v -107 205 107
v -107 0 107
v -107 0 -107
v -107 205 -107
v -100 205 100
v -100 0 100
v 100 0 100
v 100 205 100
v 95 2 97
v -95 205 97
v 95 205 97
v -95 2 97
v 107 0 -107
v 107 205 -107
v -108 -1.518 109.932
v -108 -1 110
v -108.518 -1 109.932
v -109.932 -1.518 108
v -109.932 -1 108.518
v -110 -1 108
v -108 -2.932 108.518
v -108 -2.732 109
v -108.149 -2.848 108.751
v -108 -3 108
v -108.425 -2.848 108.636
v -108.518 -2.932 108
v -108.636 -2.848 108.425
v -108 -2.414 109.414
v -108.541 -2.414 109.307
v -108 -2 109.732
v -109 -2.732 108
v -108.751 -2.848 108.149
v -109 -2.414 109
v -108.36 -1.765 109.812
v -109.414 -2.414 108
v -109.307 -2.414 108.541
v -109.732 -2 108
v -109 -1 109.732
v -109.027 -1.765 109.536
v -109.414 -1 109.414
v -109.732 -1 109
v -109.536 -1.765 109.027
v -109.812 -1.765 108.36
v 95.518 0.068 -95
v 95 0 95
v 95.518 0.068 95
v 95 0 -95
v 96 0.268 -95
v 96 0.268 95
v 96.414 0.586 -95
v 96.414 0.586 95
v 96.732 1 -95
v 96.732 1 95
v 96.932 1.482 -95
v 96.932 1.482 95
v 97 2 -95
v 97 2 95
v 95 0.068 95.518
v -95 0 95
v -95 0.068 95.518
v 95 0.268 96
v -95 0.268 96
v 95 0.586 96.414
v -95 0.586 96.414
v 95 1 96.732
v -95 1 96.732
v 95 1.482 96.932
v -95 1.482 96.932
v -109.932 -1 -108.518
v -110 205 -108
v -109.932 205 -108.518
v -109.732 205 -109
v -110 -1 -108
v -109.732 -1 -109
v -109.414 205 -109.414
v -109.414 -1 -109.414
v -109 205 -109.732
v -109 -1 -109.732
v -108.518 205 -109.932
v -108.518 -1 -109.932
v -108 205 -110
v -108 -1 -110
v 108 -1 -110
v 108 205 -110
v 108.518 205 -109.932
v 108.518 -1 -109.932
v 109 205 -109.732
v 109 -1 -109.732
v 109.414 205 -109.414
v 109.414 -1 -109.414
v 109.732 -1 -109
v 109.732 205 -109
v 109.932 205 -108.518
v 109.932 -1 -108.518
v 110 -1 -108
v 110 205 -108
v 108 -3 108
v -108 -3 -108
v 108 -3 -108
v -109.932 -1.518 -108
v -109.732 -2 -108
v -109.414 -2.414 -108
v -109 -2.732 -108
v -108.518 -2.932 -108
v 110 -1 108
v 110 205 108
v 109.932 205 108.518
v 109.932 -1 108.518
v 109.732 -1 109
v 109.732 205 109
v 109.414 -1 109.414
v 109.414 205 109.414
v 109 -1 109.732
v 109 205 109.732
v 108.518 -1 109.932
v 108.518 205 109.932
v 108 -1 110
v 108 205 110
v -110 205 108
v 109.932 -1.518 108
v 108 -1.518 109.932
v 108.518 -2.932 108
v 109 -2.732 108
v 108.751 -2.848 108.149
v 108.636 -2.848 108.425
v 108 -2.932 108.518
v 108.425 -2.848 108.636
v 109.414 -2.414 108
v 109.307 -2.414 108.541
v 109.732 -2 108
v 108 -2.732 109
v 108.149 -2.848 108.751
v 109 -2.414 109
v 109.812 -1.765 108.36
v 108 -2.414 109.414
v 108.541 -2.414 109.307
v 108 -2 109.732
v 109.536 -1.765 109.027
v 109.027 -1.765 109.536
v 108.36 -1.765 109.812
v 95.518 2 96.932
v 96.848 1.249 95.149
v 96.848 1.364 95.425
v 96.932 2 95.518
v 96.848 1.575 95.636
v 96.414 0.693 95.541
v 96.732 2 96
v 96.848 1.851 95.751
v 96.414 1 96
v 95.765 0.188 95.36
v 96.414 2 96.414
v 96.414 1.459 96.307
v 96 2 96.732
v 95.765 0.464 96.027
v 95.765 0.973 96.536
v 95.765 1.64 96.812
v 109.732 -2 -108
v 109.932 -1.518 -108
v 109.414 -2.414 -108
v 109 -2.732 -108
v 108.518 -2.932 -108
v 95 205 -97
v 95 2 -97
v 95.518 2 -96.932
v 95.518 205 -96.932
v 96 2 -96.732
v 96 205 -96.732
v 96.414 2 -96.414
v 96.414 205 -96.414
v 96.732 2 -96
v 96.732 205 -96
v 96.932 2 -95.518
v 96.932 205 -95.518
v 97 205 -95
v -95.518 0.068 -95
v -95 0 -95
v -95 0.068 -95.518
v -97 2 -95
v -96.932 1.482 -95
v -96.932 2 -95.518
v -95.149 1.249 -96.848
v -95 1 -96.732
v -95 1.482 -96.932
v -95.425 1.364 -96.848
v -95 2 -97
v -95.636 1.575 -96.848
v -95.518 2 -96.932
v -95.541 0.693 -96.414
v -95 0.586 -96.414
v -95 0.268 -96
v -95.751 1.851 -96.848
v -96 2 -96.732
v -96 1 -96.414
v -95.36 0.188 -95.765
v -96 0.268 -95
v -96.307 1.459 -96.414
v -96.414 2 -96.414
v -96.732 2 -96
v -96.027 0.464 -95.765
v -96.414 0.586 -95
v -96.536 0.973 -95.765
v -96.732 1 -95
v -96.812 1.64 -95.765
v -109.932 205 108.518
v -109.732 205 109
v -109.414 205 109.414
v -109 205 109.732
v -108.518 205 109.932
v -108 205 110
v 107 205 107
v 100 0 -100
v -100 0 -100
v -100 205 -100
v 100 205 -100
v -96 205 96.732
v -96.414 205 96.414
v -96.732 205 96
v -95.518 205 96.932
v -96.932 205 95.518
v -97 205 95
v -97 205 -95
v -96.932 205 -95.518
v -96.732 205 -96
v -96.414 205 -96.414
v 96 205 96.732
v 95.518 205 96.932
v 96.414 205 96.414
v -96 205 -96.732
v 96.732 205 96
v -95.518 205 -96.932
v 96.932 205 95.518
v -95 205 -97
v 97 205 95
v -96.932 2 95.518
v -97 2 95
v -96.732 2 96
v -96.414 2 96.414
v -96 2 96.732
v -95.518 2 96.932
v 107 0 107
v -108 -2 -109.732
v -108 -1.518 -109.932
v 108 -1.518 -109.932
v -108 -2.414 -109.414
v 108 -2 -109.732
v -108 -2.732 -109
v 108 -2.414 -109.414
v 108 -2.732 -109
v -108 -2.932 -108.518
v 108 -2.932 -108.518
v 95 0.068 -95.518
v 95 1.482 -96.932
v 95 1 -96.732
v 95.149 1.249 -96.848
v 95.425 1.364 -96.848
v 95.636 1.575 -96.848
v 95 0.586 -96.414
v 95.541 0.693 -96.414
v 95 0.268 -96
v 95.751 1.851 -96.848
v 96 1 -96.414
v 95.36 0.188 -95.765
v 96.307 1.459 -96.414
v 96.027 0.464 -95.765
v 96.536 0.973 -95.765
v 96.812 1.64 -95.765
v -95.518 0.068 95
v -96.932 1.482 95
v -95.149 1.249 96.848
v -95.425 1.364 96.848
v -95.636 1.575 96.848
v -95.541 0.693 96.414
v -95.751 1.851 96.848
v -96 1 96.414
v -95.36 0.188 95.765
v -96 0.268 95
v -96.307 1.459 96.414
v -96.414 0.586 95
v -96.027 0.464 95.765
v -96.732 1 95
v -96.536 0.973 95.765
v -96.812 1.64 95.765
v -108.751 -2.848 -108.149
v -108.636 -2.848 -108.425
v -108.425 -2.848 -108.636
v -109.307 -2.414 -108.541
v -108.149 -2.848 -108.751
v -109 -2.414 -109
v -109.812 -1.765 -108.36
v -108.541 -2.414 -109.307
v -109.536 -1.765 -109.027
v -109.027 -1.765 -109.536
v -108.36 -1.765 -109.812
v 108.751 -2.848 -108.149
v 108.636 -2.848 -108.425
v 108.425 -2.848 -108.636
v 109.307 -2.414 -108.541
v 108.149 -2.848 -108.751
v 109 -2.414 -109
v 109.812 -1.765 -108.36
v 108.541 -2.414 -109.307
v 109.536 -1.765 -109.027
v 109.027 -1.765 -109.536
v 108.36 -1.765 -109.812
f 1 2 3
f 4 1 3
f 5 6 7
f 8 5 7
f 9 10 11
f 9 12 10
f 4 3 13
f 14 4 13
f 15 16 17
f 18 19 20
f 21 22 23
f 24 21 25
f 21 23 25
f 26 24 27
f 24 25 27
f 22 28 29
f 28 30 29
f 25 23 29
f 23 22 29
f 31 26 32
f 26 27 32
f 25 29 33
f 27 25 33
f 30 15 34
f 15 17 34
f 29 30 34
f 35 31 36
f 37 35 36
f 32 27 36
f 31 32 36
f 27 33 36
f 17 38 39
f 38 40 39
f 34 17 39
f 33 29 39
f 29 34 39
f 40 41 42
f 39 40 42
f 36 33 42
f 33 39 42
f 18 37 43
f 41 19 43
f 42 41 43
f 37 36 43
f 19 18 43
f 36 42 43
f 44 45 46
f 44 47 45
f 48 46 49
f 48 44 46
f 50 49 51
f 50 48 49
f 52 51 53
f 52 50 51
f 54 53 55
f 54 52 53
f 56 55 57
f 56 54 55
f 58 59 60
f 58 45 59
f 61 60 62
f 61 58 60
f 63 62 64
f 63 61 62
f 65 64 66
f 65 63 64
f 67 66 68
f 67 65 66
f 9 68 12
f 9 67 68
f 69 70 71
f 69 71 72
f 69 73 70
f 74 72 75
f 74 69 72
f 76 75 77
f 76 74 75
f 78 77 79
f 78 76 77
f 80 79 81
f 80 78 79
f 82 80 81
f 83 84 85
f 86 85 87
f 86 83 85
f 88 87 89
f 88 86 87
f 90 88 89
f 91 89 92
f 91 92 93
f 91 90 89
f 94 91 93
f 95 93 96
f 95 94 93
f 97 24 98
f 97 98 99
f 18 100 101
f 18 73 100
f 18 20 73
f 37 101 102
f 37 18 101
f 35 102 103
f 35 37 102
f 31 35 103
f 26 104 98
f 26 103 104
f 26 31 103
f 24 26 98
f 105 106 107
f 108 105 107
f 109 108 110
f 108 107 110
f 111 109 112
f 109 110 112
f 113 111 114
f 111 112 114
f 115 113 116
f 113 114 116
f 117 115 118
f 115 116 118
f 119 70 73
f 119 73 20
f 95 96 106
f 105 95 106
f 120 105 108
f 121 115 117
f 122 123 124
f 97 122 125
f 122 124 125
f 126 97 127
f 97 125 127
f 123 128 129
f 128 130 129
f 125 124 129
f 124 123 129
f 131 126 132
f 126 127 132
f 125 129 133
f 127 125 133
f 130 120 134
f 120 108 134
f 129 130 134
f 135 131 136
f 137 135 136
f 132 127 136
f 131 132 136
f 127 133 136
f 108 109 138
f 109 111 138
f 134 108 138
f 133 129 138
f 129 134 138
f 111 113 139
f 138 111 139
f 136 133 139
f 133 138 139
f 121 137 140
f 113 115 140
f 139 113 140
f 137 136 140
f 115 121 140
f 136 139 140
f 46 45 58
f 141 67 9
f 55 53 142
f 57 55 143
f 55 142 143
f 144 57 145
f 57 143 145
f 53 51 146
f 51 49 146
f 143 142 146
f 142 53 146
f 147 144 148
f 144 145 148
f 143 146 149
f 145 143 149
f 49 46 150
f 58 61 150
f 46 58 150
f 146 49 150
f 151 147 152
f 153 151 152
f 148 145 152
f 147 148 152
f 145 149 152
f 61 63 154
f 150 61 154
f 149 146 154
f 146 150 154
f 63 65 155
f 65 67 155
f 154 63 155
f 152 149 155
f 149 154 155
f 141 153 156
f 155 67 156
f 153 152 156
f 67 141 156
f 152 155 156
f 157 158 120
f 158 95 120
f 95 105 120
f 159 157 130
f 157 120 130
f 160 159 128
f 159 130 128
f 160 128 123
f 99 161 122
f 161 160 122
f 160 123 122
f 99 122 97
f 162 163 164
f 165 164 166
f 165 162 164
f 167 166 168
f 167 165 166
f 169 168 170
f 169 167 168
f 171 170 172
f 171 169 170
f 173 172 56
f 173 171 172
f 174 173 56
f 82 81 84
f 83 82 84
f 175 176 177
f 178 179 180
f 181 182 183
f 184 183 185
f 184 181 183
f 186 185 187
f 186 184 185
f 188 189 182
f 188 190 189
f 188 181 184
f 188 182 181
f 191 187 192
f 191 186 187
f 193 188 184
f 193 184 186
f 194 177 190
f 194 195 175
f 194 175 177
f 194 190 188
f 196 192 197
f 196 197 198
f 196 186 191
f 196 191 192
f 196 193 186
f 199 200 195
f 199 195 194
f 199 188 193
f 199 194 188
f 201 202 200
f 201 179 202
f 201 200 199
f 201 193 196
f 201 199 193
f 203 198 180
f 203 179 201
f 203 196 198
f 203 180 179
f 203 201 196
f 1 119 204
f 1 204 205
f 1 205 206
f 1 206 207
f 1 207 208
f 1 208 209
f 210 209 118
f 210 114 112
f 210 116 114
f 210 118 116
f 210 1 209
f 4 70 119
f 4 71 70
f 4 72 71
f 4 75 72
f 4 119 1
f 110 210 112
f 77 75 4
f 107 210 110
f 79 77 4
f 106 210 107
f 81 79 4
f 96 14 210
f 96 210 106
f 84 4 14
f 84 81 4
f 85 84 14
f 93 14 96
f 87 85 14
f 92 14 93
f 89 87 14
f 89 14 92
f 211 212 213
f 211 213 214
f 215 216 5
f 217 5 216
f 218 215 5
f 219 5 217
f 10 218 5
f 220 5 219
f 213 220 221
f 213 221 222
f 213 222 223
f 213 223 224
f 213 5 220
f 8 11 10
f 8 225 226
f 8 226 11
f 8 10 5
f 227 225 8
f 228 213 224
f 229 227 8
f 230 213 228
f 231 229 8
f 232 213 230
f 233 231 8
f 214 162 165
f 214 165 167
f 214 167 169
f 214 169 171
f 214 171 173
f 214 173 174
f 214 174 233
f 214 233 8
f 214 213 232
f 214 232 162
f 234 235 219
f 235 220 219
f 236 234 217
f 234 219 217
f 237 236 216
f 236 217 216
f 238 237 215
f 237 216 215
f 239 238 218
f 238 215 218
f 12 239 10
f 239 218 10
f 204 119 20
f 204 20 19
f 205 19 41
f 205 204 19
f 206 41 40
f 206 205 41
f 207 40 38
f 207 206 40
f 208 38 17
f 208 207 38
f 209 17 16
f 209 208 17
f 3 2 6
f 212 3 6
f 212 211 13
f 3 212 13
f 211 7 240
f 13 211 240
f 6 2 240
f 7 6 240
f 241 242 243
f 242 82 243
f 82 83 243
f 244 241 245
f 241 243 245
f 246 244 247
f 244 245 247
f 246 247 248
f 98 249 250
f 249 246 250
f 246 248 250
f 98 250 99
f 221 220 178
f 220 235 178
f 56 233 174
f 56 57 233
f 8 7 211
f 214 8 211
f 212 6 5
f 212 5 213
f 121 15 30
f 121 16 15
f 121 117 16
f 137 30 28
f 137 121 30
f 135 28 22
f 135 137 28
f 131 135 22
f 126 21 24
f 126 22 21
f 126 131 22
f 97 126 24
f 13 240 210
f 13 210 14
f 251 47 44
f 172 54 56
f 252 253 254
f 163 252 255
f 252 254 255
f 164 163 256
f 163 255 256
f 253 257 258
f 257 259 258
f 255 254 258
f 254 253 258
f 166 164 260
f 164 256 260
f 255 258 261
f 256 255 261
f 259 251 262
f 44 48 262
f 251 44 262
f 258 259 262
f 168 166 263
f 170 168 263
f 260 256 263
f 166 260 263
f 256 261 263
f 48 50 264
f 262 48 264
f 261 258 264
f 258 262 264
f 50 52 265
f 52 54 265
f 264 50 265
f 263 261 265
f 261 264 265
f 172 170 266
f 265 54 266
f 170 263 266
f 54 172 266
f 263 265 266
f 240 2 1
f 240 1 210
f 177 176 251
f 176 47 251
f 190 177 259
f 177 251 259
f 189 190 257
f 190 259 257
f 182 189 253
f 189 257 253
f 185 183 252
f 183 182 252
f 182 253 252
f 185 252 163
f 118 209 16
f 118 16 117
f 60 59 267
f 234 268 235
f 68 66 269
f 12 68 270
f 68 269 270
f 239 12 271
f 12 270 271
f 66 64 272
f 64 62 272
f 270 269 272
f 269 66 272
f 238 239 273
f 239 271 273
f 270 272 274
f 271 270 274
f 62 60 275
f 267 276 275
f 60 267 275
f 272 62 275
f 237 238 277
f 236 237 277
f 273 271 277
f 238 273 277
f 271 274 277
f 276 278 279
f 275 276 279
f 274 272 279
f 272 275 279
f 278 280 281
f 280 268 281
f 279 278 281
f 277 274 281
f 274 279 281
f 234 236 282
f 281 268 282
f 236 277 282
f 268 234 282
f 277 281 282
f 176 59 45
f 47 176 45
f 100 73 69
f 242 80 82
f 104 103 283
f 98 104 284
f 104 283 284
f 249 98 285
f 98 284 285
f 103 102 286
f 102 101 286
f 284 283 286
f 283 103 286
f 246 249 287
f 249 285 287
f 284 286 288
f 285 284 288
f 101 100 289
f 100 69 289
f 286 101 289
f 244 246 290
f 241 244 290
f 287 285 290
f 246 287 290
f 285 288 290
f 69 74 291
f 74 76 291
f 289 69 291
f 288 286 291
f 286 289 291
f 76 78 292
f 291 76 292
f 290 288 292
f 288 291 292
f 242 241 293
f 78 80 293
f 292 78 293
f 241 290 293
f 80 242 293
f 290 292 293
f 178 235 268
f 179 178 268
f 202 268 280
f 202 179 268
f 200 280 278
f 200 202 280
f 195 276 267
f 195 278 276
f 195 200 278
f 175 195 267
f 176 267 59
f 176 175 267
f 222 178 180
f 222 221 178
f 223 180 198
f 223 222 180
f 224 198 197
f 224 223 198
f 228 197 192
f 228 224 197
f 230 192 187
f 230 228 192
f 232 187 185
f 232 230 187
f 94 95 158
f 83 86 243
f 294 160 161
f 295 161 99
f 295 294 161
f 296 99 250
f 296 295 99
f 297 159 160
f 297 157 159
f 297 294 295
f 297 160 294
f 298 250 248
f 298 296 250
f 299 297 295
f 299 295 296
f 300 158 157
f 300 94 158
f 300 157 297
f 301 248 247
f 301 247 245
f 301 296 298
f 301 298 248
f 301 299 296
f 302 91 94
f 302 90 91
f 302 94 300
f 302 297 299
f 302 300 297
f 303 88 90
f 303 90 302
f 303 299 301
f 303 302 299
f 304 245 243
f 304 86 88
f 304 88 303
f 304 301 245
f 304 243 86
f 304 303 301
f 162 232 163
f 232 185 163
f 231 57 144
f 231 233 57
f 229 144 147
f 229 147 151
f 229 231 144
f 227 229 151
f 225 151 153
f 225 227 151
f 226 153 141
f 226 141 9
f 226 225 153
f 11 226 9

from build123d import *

# Parameters (mm, degrees)
SKETCH1_W             = 200
SKETCH1_H             = 200
SKETCH1_W_2           = 194
SKETCH1_H_2           = 194
BOSS_EXTRUDE1_DEPTH   = 205
SKETCH1_W_3           = 220
SKETCH1_H_3           = 220
SKETCH1_W_4           = 214
SKETCH1_H_4           = 214
BOSS_EXTRUDE1_2_DEPTH = 205
SKETCH3_W             = 220
SKETCH3_H             = 220
BOSS_EXTRUDE3_DEPTH   = 3
FILLET1_R             = 2


with BuildPart() as part:
    # Sketch1 → Boss-Extrude1 (new body)
    with BuildSketch(Plane(origin=(0, 0, 0), x_dir=(1, 0, 0), z_dir=(0, 1, 0))):
        Rectangle(SKETCH1_W, SKETCH1_H)
        Rectangle(SKETCH1_W_2, SKETCH1_H_2, mode=Mode.SUBTRACT)
    extrude(amount=BOSS_EXTRUDE1_DEPTH)



with BuildPart() as body_2:
    # Sketch1 → Boss-Extrude1 2 (new body)
    with BuildSketch(Plane(origin=(0, 0, 0), x_dir=(1, 0, 0), z_dir=(0, 1, 0))):
        Rectangle(SKETCH1_W_3, SKETCH1_H_3)
        Rectangle(SKETCH1_W_4, SKETCH1_H_4, mode=Mode.SUBTRACT)
    extrude(amount=BOSS_EXTRUDE1_2_DEPTH)


with BuildPart() as part_1:
    add(part.part)

    add(body_2.part)  # Boss-Extrude3 merges body 2
    # Sketch3 → Boss-Extrude3 (add)
    with BuildSketch(Plane.XZ):
        Rectangle(SKETCH3_W, SKETCH3_H)
    extrude(amount=BOSS_EXTRUDE3_DEPTH)

    # Fillet1
    fillet1_edges = [part_1.edges().sort_by_distance(p)[0] for p in [
        (-97, 0, 0),
        (0, 0, 97),
        (97, 0, 0),
        (0, 0, -97),
        (-97, 102.5, -97),
        (-97, 102.5, 97),
        (97, 102.5, 97),
        (97, 102.5, -97),
        (110, 101, -110),
        (110, 101, 110),
        (-110, 101, 110),
        (-110, 101, -110),
        (110, -3, 0),
        (0, -3, 110),
        (-110, -3, 0),
        (0, -3, -110),
    ]]
    fillet(fillet1_edges, radius=FILLET1_R)


solid = part_1.part
